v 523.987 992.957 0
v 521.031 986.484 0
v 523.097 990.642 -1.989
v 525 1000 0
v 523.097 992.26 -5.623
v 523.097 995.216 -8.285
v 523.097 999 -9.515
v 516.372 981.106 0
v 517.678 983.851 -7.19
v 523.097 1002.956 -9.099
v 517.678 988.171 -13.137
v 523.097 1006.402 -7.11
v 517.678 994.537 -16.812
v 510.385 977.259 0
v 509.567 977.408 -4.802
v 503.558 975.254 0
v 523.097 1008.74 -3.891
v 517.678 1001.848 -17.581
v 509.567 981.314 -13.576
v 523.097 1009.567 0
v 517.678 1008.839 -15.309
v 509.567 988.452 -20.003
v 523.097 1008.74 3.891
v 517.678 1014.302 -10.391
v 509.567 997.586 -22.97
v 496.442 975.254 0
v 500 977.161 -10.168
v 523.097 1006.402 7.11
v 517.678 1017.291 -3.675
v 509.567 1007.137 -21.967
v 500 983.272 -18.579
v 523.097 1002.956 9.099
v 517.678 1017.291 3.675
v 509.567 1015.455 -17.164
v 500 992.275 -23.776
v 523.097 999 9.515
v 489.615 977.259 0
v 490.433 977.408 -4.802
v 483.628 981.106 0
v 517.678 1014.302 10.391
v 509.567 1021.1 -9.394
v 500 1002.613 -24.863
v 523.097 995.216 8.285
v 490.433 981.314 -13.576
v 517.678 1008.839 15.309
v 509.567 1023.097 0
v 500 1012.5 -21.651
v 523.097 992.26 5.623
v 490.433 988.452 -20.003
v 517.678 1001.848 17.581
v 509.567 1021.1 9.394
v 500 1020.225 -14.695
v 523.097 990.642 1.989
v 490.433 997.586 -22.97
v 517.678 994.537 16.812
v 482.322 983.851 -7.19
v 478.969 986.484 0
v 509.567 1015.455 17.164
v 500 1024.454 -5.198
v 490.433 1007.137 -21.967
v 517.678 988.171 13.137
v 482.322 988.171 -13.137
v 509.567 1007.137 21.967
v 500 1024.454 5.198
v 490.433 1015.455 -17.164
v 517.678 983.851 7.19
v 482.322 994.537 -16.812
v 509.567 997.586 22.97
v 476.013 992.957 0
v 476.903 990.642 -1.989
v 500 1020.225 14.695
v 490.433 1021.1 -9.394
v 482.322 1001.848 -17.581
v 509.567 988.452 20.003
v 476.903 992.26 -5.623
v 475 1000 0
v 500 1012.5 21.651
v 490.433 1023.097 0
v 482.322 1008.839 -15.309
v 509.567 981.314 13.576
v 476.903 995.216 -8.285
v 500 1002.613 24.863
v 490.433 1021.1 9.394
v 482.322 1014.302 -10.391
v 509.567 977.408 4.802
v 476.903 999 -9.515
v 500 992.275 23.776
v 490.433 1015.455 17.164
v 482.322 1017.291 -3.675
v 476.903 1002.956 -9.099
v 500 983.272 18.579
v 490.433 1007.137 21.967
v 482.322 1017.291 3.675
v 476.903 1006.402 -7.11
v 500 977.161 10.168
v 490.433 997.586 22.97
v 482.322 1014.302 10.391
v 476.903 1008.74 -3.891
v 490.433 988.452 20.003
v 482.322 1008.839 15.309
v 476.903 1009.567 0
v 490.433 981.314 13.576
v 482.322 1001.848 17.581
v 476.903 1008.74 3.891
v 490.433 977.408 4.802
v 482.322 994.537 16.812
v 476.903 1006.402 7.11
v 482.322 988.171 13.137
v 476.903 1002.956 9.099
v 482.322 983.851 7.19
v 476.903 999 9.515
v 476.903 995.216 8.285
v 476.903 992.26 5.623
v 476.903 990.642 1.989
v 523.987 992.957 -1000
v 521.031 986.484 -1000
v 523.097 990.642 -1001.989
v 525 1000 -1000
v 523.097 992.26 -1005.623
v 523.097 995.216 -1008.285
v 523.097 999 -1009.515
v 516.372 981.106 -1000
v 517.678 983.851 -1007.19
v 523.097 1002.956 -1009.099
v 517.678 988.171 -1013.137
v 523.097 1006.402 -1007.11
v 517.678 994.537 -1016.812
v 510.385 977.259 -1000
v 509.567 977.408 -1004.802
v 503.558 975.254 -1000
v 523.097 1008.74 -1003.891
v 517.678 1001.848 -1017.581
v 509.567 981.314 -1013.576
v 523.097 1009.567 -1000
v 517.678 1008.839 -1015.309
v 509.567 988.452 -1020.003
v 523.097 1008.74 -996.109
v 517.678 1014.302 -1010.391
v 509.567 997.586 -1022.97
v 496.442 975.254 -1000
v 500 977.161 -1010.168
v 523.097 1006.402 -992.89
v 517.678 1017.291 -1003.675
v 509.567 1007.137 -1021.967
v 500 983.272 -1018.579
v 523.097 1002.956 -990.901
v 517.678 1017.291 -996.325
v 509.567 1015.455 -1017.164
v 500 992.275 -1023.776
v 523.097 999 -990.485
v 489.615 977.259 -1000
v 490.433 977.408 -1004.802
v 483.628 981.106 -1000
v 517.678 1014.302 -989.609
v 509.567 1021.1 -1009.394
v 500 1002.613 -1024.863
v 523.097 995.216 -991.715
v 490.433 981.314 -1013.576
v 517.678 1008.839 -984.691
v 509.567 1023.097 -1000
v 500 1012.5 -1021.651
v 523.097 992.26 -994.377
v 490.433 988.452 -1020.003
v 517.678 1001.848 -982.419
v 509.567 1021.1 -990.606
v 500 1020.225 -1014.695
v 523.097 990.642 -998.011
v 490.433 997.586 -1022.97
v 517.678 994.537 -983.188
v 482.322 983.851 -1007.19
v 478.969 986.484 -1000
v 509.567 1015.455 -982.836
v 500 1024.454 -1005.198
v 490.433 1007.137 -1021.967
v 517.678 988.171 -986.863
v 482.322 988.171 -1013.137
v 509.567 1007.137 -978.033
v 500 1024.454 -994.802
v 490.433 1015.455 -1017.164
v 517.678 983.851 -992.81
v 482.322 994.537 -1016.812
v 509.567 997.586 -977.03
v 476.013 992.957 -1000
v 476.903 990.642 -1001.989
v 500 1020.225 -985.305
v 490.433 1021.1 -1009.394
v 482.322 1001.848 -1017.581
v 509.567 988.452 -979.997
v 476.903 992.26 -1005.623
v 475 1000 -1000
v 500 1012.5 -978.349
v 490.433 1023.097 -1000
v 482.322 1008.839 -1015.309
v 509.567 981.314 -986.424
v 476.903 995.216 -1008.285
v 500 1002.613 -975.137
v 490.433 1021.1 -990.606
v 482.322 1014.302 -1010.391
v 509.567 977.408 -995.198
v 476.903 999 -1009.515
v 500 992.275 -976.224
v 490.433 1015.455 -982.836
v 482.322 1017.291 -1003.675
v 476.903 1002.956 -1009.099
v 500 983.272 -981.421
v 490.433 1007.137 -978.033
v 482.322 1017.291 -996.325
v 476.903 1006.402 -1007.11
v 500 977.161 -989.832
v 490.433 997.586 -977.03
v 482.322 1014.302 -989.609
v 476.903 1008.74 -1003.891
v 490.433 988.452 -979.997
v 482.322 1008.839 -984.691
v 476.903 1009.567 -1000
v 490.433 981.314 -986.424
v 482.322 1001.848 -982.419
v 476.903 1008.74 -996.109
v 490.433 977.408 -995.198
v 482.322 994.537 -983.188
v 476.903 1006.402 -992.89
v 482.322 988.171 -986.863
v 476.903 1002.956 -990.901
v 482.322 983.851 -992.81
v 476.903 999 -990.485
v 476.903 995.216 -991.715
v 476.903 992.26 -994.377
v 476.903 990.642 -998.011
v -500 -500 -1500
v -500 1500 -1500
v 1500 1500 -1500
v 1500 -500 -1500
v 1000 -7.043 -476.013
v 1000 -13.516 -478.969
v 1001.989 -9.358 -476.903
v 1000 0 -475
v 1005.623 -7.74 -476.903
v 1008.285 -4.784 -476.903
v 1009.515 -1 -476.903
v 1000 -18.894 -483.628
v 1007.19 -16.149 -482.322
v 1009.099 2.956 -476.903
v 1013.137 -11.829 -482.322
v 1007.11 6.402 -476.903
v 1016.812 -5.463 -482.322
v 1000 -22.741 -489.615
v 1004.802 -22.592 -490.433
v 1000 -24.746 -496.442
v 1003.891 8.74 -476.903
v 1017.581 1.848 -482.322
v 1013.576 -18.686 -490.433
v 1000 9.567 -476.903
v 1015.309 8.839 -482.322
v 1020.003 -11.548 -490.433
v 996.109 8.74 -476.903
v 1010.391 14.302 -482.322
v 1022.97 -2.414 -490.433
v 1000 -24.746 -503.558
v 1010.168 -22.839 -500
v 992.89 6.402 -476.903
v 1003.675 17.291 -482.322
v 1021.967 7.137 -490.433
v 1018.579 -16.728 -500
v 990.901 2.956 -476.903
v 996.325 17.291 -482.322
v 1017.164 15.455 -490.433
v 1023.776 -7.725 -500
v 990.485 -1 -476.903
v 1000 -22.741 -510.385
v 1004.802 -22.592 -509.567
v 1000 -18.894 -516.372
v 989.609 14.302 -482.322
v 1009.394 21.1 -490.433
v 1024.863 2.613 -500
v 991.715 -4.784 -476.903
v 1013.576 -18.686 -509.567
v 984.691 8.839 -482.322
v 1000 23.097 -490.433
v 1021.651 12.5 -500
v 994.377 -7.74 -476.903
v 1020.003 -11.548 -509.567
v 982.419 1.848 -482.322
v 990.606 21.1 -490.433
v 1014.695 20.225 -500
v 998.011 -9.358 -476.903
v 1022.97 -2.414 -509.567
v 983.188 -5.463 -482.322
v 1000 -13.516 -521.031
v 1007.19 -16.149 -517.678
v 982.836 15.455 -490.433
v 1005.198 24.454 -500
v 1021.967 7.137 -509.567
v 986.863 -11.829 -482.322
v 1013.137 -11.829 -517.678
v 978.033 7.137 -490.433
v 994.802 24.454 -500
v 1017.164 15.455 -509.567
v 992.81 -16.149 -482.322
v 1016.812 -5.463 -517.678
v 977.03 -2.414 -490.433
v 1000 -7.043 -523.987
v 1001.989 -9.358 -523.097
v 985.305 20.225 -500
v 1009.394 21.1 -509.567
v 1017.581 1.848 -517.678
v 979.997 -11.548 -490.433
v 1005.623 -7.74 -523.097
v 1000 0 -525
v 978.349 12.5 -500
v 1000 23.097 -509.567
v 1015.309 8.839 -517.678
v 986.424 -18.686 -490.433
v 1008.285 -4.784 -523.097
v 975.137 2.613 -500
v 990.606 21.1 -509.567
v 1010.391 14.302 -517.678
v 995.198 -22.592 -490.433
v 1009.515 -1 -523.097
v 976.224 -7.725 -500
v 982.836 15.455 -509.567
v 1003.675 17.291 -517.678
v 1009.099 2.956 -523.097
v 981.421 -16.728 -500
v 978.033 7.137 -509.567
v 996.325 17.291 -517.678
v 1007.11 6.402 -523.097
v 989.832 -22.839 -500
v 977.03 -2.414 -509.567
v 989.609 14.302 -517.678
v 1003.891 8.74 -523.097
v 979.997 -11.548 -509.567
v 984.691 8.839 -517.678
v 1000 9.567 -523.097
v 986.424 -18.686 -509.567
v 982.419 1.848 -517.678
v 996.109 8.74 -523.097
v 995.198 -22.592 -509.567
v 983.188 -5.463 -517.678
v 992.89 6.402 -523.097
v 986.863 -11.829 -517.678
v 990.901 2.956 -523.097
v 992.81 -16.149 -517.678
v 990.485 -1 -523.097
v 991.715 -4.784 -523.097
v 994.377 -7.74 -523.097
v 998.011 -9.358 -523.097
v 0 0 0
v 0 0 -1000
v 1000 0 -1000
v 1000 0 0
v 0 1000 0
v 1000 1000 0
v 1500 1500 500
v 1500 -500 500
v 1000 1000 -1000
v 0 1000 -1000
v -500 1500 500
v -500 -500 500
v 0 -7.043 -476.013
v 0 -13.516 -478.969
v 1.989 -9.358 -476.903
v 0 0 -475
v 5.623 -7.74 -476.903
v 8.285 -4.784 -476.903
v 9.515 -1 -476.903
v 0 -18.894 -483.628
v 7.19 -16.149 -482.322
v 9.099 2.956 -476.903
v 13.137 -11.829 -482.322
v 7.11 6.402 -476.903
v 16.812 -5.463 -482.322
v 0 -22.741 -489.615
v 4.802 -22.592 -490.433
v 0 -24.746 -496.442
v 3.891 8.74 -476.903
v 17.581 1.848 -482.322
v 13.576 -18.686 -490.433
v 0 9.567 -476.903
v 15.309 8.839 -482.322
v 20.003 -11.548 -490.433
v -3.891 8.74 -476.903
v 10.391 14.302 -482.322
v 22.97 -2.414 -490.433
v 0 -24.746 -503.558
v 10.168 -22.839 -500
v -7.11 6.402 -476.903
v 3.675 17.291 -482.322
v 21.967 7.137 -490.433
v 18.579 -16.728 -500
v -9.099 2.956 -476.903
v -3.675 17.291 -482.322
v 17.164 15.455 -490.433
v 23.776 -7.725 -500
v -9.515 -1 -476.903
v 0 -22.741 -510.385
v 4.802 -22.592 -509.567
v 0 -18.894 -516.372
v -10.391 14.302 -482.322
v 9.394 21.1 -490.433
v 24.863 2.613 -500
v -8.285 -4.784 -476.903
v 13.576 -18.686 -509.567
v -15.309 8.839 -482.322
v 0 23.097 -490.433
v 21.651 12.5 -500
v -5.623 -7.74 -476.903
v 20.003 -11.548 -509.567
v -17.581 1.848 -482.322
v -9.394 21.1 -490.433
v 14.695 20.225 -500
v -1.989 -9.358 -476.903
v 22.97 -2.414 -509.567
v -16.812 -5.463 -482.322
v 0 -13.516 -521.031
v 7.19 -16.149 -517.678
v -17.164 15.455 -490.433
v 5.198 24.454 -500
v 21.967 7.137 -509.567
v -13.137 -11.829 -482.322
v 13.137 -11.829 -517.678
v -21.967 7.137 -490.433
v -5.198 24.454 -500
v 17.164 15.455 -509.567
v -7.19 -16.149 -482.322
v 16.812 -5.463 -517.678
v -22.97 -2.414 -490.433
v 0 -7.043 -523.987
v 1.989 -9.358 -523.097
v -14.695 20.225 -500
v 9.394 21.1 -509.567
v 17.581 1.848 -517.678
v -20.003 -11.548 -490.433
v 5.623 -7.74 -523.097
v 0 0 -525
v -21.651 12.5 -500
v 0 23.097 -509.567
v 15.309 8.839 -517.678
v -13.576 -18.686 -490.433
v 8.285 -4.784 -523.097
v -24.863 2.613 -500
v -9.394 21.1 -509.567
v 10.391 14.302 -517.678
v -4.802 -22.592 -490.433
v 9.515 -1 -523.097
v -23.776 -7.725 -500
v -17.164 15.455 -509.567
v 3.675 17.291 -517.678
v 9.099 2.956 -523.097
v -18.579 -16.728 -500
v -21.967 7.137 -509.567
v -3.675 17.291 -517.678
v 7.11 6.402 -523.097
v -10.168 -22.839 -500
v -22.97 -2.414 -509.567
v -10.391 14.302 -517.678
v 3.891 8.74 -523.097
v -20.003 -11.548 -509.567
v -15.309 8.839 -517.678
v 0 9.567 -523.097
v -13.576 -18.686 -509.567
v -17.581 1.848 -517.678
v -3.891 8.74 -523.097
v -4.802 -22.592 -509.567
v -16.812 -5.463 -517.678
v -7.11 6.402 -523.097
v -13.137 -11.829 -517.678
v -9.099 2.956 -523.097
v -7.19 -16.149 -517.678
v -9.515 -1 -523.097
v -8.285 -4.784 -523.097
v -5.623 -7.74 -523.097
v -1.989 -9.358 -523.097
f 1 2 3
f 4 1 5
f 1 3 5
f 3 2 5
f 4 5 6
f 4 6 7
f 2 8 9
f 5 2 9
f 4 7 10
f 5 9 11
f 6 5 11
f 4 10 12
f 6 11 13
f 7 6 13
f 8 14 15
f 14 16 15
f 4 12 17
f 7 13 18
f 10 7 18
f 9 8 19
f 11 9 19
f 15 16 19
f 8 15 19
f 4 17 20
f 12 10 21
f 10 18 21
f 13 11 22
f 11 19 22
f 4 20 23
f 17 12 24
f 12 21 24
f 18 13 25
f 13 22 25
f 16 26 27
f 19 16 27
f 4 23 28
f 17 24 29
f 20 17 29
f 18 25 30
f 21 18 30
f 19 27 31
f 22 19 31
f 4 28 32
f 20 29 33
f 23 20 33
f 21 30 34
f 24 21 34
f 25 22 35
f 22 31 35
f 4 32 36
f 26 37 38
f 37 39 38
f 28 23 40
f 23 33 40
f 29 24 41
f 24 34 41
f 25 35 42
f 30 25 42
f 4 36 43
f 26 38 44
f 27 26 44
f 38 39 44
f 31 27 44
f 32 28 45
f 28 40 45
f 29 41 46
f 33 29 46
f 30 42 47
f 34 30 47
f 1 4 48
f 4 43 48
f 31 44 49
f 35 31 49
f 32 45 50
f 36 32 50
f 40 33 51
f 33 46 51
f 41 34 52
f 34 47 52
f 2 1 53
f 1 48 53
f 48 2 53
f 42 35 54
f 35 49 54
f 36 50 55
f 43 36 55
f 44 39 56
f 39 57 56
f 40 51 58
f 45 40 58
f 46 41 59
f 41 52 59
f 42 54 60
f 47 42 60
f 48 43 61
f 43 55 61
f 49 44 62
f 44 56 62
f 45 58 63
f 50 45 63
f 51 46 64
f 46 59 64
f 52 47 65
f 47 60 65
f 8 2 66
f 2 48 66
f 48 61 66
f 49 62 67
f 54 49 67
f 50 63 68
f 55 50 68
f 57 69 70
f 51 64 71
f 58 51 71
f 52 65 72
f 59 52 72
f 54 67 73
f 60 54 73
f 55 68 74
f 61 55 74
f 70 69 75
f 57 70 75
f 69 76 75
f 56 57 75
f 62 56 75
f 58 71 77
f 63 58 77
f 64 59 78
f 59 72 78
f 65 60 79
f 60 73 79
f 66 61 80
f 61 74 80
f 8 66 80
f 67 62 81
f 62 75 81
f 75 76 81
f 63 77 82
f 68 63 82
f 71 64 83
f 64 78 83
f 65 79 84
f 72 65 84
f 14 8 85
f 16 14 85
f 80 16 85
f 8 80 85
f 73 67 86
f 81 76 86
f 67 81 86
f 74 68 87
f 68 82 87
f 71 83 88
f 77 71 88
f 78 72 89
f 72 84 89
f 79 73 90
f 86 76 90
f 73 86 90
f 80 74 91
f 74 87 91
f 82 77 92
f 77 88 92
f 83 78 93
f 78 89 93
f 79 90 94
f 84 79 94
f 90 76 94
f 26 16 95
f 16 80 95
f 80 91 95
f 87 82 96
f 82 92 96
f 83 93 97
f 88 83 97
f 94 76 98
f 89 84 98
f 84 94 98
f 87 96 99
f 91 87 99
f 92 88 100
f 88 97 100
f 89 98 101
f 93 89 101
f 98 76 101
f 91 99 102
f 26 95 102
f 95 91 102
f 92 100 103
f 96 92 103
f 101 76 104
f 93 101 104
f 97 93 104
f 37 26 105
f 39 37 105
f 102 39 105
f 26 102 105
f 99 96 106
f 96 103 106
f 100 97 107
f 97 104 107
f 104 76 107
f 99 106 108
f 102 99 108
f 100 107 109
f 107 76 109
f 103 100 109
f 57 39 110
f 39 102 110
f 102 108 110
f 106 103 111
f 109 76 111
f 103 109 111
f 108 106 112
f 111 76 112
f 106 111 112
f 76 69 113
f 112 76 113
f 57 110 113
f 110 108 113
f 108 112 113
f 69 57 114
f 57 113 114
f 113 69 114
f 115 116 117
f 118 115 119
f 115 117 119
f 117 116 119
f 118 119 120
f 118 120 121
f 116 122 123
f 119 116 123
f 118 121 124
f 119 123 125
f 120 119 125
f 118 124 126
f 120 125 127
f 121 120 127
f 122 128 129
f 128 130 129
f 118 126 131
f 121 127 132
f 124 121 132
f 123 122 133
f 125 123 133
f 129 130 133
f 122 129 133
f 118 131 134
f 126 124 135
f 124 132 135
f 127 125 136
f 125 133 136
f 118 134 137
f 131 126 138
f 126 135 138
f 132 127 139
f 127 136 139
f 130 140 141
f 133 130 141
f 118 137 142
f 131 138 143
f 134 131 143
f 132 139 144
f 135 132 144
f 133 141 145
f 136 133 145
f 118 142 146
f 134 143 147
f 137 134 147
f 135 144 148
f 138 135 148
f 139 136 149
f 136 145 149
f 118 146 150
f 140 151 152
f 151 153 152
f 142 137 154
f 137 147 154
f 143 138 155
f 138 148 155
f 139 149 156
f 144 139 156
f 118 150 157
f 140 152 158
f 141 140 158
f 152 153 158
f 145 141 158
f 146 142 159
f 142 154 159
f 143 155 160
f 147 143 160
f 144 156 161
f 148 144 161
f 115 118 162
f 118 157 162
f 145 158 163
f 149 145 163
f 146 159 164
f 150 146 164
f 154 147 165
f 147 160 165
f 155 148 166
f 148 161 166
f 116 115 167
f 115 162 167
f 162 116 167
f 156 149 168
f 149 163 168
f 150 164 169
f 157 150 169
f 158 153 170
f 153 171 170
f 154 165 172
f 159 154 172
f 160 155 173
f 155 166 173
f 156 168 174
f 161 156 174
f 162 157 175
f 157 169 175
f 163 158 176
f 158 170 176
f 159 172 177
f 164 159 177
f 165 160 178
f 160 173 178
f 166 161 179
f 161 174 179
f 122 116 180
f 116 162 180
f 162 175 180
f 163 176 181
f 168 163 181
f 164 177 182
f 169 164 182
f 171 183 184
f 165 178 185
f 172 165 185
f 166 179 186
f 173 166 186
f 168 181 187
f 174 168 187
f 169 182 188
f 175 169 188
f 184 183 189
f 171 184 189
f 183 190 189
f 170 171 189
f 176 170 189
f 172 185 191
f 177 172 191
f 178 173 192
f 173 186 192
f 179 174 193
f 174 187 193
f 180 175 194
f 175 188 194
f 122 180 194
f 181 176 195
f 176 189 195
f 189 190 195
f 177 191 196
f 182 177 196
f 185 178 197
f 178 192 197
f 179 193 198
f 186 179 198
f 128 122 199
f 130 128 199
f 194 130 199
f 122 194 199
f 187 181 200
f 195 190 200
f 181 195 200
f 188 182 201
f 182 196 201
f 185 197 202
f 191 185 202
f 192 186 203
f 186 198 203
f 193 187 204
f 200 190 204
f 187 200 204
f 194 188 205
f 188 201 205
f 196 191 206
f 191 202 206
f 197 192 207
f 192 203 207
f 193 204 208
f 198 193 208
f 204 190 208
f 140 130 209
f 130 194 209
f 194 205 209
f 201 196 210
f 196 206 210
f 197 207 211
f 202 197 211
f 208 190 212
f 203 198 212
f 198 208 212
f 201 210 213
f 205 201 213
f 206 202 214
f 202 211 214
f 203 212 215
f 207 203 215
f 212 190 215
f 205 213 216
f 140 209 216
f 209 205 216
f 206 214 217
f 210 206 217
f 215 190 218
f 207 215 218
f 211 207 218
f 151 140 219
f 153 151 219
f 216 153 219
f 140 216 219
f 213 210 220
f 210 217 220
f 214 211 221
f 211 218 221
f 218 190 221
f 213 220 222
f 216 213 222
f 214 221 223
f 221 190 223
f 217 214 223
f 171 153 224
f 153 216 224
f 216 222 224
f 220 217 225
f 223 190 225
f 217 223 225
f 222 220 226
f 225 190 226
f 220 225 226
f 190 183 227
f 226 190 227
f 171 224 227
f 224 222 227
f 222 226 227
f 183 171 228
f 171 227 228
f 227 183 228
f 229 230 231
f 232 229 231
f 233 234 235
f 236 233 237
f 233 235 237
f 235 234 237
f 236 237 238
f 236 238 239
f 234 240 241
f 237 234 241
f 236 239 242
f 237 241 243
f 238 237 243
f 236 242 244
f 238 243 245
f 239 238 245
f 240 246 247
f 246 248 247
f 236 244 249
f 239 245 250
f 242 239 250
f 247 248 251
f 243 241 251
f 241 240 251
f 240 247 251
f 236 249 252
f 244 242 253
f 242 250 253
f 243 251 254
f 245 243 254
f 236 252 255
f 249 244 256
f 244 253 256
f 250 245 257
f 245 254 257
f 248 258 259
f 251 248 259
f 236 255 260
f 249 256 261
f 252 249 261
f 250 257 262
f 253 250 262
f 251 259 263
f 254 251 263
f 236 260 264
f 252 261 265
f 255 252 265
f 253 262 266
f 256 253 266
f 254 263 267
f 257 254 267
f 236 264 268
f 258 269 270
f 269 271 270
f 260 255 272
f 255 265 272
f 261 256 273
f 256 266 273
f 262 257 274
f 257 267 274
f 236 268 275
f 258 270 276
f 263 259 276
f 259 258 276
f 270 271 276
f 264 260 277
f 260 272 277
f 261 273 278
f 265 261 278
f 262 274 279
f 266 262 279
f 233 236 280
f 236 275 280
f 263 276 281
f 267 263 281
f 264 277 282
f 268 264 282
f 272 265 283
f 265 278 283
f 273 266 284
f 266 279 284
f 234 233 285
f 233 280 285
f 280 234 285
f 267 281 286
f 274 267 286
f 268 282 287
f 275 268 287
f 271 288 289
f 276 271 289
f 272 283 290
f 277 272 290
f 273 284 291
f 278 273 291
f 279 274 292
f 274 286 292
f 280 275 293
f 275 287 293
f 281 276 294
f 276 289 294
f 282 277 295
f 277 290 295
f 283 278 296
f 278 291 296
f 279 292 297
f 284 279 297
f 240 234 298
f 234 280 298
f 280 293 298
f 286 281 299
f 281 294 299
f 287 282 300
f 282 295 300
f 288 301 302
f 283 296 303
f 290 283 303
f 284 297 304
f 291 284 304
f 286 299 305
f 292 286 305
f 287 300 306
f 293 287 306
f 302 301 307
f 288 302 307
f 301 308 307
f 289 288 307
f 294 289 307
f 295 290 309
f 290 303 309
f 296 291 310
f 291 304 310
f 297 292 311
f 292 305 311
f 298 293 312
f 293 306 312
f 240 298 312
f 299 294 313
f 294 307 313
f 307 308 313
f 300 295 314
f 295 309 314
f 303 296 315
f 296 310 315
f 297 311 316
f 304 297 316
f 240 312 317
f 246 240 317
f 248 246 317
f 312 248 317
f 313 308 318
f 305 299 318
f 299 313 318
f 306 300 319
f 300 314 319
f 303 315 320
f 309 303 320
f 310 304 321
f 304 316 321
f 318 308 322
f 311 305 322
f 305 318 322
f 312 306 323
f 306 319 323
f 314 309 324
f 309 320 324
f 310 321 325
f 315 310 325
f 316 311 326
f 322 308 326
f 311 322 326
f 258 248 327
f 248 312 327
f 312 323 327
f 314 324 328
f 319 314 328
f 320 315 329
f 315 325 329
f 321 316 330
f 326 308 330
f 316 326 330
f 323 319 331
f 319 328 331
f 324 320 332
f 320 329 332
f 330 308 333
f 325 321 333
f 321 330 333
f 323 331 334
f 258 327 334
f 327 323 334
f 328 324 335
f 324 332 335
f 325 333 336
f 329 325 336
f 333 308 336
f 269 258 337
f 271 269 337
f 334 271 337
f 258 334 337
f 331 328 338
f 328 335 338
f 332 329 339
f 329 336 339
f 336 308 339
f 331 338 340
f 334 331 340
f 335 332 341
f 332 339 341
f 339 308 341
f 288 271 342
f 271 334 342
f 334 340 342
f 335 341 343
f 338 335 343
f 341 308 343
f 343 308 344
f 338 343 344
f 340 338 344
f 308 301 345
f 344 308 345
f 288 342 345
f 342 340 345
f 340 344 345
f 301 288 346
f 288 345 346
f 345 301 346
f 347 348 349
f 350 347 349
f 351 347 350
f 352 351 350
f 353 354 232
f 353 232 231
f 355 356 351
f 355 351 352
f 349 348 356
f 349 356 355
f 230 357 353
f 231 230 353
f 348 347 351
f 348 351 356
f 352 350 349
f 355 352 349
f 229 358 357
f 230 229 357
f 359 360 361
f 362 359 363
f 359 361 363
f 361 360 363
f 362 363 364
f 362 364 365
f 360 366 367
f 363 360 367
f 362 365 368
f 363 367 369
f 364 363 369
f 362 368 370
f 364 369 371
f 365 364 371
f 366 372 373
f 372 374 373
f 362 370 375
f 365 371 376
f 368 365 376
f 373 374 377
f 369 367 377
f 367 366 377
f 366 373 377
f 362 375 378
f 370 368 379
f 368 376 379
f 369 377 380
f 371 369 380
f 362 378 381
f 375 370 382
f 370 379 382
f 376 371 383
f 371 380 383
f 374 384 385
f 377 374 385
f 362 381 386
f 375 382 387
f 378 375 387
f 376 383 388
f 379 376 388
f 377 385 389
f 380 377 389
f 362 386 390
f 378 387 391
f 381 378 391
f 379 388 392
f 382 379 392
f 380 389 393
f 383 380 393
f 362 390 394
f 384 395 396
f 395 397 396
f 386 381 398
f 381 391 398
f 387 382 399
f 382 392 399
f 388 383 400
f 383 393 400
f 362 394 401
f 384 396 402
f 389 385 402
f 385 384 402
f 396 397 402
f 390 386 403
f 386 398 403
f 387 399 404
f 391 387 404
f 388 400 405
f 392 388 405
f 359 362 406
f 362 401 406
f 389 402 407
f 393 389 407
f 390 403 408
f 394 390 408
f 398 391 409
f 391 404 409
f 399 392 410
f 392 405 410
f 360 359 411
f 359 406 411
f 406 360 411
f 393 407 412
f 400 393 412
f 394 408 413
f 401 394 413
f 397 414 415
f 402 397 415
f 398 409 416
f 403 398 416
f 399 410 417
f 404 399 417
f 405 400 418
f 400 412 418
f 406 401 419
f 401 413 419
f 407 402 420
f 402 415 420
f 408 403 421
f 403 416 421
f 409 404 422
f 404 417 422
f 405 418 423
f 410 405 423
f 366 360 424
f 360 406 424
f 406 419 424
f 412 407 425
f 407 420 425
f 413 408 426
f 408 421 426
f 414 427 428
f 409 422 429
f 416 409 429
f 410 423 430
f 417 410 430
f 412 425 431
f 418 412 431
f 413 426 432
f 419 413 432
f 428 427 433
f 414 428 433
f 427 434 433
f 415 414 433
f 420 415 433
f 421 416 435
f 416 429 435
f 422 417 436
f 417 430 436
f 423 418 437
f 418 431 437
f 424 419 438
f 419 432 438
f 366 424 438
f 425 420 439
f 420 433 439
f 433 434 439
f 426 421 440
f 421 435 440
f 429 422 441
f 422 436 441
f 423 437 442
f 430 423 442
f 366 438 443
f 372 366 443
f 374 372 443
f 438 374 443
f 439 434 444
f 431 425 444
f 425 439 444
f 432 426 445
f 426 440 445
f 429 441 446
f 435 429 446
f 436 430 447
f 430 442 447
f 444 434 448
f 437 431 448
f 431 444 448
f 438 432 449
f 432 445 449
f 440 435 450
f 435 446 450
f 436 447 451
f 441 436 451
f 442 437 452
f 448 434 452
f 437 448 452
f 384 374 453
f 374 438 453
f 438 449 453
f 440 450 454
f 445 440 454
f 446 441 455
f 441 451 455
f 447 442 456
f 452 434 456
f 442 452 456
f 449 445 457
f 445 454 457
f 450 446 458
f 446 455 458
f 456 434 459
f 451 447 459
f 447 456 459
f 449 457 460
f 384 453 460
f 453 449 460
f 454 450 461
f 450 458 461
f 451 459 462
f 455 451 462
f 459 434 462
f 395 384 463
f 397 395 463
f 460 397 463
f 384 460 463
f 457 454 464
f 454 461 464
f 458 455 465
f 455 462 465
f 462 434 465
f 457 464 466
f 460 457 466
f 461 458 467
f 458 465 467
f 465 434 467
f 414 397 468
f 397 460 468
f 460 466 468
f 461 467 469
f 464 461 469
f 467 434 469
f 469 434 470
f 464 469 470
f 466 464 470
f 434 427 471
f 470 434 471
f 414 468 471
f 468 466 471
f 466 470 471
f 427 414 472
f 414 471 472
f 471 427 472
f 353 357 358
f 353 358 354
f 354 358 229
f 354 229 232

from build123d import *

# Parameters (mm, degrees)
SKETCH4_W           = 1000
SKETCH4_H           = 1000
BOSS_EXTRUDE2_DEPTH = 1000
LPATTERN1_COUNT     = 2
LPATTERN1_PITCH     = 1000
LPATTERN2_COUNT     = 2
LPATTERN2_PITCH     = 1000
SKETCH8_W           = 2000
SKETCH8_H           = 2000
BOSS_EXTRUDE3_DEPTH = 2000


with BuildPart() as part:
    # Sketch4 → Boss-Extrude2 (new body)
    with BuildSketch(Plane(origin=(0, 0, 0), x_dir=(1, 0, 0), z_dir=(0, 1, 0))):
        with Locations((500, 500)):
            Rectangle(SKETCH4_W, SKETCH4_H)
    extrude(amount=BOSS_EXTRUDE2_DEPTH)


with BuildPart() as body_2:
    # Sketch5 → Revolve1 (revolve)
    with BuildSketch(Plane.XY):
        with BuildLine():
            Line((475, 1000), (525, 1000))
            ThreePointArc((525, 1000), (500, 975), (475, 1000))
        make_face()
    revolve(axis=Axis((0, 1000, 0), (1, 0, 0)))


with BuildPart() as lpattern1_1:
    # LPattern1: pattern copy
    add(body_2.part.moved(Location(Vector(0, 0, -1) * (1 * LPATTERN1_PITCH))))


with BuildPart() as body_4:
    # Sketch6 → Revolve2 (revolve)
    with BuildSketch(Plane.ZY):
        with BuildLine():
            Line((-525, 0), (-475, 0))
            ThreePointArc((-475, 0), (-500, -25), (-525, 0))
        make_face()
    revolve(axis=Axis((0, 0, 0), (0, 0, 1)))


with BuildPart() as lpattern2_1:
    # LPattern2: pattern copy
    add(body_4.part.moved(Location(Vector(1, 0, 0) * (1 * LPATTERN2_PITCH))))


with BuildPart() as body_6:
    # Sketch8 → Boss-Extrude3 (new body)
    with BuildSketch(Plane.XY.offset(500)):
        with Locations((500, 500)):
            Rectangle(SKETCH8_W, SKETCH8_H)
    extrude(amount=-BOSS_EXTRUDE3_DEPTH)


solid = Compound([part.part, body_2.part, lpattern1_1.part, body_4.part, lpattern2_1.part, body_6.part])
